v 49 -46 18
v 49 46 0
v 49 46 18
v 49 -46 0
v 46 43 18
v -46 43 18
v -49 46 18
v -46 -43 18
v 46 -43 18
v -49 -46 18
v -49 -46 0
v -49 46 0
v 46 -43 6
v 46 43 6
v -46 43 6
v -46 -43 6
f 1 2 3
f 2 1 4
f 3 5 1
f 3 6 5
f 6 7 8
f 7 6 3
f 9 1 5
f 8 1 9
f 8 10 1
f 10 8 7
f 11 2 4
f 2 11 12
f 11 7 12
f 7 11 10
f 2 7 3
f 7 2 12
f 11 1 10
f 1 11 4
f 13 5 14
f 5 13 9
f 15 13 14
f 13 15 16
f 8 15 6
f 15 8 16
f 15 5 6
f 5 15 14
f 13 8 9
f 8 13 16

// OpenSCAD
// Emil on the ETA 5229 Master. All dimensions are in mm; Z is up for printing.
// Original geometry: Emil-V1.glb, nodes 68–72 (tray) and 99 (sample object).
// In the robot's original coordinates, the tray bottom centre is [0, 115, 97]
// (X forward, Y up, Z right). The upper surface of its floor is at Y = 121.
// Verify available space and retention on the actual platform before mounting.

part = "tray"; // [tray,ball,footprint]

tray_length = 98;
tray_width = 92;
tray_floor = 6;
tray_wall = 3;
tray_rim_height = 12;    // measured from the inside floor
ball_diameter = 32;

// Stock Waveshare Robot Arm for Pi base, excluding cables. The manufacturer's
// dimensioned photo gives the exterior envelope but does not locate screw holes.
// https://www.waveshare.com/img/devkit/accBoard/Robot-Arm-for-Pi/Robot-Arm-for-Pi-size.jpg
base_length = 149.6;
base_width = 80;
gauge_height = 2;
gauge_border = 5;

module collection_tray() {
    height = tray_floor + tray_rim_height;
    difference() {
        translate([-tray_length/2, -tray_width/2, 0])
            cube([tray_length, tray_width, height]);
        // Extend the cutter through the opening to avoid coincident top faces.
        translate([-tray_length/2 + tray_wall, -tray_width/2 + tray_wall, tray_floor])
            cube([tray_length - 2*tray_wall, tray_width - 2*tray_wall, tray_rim_height + 1]);
    }
}

module test_ball() {
    // Cross-sections meet the poles and equator exactly. The ball has the
    // simulator's full round profile and will need support for a one-piece print.
    radius = ball_diameter / 2;
    profile = [for (a = [-90:3:90])
        [abs(a) == 90 ? 0 : radius*cos(a), radius + radius*sin(a)]];
    rotate_extrude($fn=96) polygon(profile);
}

module stock_base_footprint() {
    // Lay the outside perimeter on the ETA platform to check available space.
    // Set length/width to measured values to regenerate the rectangular envelope.
    // The stock base has rounded corners; this gauge includes those corner boxes.
    difference() {
        translate([-base_length/2, -base_width/2, 0])
            cube([base_length, base_width, gauge_height]);
        translate([-base_length/2 + gauge_border, -base_width/2 + gauge_border, -1])
            cube([base_length - 2*gauge_border, base_width - 2*gauge_border, gauge_height + 2]);
    }
}

if (part == "tray") collection_tray();
else if (part == "ball") test_ball();
else if (part == "footprint") stock_base_footprint();
else assert(false, str("Unknown part: ", part));
